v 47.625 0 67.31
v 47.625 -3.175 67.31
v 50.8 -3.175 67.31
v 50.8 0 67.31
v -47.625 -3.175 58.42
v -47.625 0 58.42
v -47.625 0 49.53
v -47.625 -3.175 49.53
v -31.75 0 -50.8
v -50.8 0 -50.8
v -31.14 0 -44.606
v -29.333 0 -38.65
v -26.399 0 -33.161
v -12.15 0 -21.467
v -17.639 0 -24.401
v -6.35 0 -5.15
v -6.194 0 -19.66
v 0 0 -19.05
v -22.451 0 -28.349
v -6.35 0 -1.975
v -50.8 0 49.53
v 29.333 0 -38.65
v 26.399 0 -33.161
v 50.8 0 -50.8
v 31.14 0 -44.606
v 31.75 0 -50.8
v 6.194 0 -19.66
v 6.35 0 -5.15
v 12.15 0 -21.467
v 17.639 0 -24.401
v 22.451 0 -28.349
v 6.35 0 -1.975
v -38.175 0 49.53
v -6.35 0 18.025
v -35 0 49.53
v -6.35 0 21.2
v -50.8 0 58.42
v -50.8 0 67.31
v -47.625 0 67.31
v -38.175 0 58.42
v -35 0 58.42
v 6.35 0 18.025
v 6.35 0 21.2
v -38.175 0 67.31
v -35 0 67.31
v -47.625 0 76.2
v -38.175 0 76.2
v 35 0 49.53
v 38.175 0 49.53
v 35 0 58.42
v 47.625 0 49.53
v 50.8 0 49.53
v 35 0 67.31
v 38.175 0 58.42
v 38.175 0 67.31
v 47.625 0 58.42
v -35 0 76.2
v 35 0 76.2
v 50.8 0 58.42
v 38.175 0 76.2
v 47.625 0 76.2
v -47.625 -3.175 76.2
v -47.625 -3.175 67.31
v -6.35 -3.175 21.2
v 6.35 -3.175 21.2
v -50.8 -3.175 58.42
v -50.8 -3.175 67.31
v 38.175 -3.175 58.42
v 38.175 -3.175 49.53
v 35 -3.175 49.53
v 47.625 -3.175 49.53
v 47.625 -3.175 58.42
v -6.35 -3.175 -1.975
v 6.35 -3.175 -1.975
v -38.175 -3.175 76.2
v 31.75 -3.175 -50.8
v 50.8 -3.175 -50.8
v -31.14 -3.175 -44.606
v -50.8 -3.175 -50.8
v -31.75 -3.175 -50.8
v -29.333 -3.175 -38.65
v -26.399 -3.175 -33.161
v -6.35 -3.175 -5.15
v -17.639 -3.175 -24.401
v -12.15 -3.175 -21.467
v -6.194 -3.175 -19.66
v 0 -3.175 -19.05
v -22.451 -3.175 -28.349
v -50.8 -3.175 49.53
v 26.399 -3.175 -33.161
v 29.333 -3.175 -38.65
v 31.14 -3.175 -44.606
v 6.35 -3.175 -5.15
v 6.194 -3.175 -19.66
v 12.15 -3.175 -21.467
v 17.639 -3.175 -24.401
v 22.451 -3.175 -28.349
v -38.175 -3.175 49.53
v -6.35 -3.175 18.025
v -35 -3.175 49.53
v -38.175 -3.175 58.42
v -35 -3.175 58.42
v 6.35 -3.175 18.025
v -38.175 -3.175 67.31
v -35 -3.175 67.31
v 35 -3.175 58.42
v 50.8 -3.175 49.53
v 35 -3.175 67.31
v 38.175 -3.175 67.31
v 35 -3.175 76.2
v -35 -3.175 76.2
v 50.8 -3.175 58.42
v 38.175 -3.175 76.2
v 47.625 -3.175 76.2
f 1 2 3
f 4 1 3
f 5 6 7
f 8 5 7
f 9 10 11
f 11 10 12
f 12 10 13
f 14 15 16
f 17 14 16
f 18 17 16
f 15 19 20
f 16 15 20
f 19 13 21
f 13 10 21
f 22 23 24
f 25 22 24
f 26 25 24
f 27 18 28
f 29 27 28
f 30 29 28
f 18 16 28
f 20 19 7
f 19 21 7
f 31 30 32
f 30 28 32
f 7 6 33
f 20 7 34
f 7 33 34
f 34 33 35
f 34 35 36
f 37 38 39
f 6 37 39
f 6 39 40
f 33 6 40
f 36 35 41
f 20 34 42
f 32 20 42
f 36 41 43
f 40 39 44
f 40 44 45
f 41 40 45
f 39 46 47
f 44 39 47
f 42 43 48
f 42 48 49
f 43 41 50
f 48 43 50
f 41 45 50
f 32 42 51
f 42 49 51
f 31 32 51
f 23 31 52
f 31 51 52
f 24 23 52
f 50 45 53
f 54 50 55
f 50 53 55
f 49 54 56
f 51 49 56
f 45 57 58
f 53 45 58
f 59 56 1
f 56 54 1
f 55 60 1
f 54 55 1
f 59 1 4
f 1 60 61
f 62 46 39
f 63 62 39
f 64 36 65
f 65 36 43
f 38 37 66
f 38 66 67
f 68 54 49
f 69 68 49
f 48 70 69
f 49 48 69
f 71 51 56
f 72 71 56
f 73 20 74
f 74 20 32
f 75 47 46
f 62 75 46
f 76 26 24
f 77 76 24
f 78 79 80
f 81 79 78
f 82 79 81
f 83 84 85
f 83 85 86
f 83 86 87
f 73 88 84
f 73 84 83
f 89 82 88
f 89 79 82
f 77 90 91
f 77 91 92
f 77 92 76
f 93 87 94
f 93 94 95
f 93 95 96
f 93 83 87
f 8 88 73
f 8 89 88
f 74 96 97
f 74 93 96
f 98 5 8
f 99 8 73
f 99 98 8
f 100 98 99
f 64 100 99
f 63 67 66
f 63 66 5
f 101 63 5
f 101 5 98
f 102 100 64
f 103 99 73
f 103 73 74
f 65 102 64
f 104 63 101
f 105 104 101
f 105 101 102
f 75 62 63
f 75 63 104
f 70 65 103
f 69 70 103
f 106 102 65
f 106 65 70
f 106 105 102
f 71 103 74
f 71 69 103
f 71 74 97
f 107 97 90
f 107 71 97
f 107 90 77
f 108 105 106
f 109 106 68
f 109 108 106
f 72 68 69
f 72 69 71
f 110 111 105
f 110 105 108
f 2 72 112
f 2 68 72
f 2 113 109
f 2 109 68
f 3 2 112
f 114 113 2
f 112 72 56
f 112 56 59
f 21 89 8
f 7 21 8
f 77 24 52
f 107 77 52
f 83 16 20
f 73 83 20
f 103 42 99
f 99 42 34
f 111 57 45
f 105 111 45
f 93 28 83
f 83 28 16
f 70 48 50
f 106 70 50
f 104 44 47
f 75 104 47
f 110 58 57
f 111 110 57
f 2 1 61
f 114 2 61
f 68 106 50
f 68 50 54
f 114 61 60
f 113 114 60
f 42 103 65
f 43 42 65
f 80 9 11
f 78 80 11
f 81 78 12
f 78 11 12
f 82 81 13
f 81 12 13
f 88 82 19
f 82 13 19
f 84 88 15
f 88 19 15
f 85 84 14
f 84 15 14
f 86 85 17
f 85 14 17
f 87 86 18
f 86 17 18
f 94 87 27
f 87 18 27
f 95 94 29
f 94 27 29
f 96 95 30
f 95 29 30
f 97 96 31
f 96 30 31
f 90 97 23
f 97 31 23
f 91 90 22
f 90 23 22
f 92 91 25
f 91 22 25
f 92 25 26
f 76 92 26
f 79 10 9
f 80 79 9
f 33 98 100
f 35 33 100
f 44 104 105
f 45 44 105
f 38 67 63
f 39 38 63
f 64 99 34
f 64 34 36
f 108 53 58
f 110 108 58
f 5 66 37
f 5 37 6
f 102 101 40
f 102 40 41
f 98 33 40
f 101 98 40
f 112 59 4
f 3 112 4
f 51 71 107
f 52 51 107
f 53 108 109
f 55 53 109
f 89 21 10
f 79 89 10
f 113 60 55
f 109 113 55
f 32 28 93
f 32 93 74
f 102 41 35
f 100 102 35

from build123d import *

# Parameters (mm, degrees)
F0_W     = 3.175
F0_H     = 8.89
F0_H_2   = 12.7
F0_H_3   = 49.53
F0_H_4   = 27.94
F0_W_2   = 8.89
F0_H_5   = 11.43
F0_W_3   = 12.7
F0_H_6   = 3.175
F1_DEPTH = 3.175


with BuildPart() as f1:
    # F0 (on Front) → F1 (new body)
    with BuildSketch(Plane.XZ):
        with BuildLine():
            Line((-38.175, 76.2), (-47.625, 76.2))
            Line((-47.625, 76.2), (-47.625, 67.31))
            Line((-47.625, 67.31), (-47.625, 58.42))
            Line((-47.625, 58.42), (-47.625, 49.53))
            Line((-47.625, 49.53), (-47.625, 40.64))
            Line((-47.625, 40.64), (-47.625, 27.94))
            Line((-47.625, 27.94), (-47.625, 0))
            Line((-47.625, 0), (-50.8, 0))
            Line((-50.8, 0), (-50.8, -50.8))
            Line((-50.8, -50.8), (-43.18, -50.8))
            Line((-43.18, -50.8), (-43.18, -41.91))
            Line((-43.18, -41.91), (-34.29, -41.91))
            Line((-34.29, -41.91), (-34.29, -50.8))
            Line((-34.29, -50.8), (-31.75, -50.8))
            ThreePointArc((-31.75, -50.8), (0, -19.05), (31.75, -50.8))
            Line((31.75, -50.8), (50.8, -50.8))
            Line((50.8, -50.8), (50.8, 0))
            Line((50.8, 0), (47.625, 0))
            Line((47.625, 0), (47.625, 12.7))
            Line((47.625, 12.7), (47.625, 25.4))
            Line((47.625, 25.4), (47.625, 38.1))
            Line((47.625, 38.1), (47.625, 49.53))
            Line((47.625, 49.53), (47.625, 58.42))
            Line((47.625, 58.42), (47.625, 67.31))
            Line((47.625, 67.31), (47.625, 76.2))
            Line((47.625, 76.2), (38.175, 76.2))
            Line((38.175, 76.2), (38.175, 67.31))
            Line((38.175, 67.31), (38.175, 58.42))
            Line((38.175, 58.42), (38.175, 49.53))
            Line((38.175, 49.53), (38.175, 40.64))
            Line((38.175, 40.64), (38.175, 27.94))
            Line((38.175, 27.94), (38.175, 0))
            Line((38.175, 0), (35, 0))
            Line((35, 0), (35, 27.94))
            Line((35, 27.94), (35, 40.64))
            Line((35, 40.64), (35, 49.53))
            Line((35, 49.53), (35, 58.42))
            Line((35, 58.42), (35, 67.31))
            Line((35, 67.31), (35, 76.2))
            Line((35, 76.2), (-35, 76.2))
            Line((-35, 76.2), (-35, 67.31))
            Line((-35, 67.31), (-35, 58.42))
            Line((-35, 58.42), (-35, 49.53))
            Line((-35, 49.53), (-35, 0))
            Line((-35, 0), (-38.175, 0))
            Line((-38.175, 0), (-38.175, 49.53))
            Line((-38.175, 49.53), (-38.175, 58.42))
            Line((-38.175, 58.42), (-38.175, 67.31))
            Line((-38.175, 67.31), (-38.175, 76.2))
        make_face()
        Polygon((19.05, -1.975), (31.75, -1.975), (31.75, -5.15), (19.05, -5.15), (6.35, -5.15), (-6.35, -5.15), (-19.05, -5.15), (-31.75, -5.15), (-31.75, -1.975), (-19.05, -1.975), (-6.35, -1.975), (6.35, -1.975), align=None, mode=Mode.SUBTRACT)
        Polygon((19.05, 21.2), (31.75, 21.2), (31.75, 18.025), (19.05, 18.025), (6.35, 18.025), (-6.35, 18.025), (-19.05, 18.025), (-31.75, 18.025), (-31.75, 21.2), (-19.05, 21.2), (-6.35, 21.2), (6.35, 21.2), align=None, mode=Mode.SUBTRACT)
        with Locations((-49.2125, 62.865)):
            Rectangle(F0_W, F0_H)
        with Locations((-36.5875, 62.865)):
            Rectangle(F0_W, F0_H)
        with Locations((-49.2125, 45.085)):
            Rectangle(F0_W, F0_H)
        with Locations((-49.2125, 34.29)):
            Rectangle(F0_W, F0_H_2)
        with Locations((36.5875, 62.865)):
            Rectangle(F0_W, F0_H)
        with Locations((-36.5875, 24.765)):
            Rectangle(F0_W, F0_H_3)
        with Locations((-49.2125, 13.97)):
            Rectangle(F0_W, F0_H_4)
        with Locations((49.2125, 62.865)):
            Rectangle(F0_W, F0_H)
        with Locations((36.5875, 45.085)):
            Rectangle(F0_W, F0_H)
        with Locations((36.5875, 34.29)):
            Rectangle(F0_W, F0_H_2)
        with Locations((-38.735, -46.355)):
            Rectangle(F0_W_2, F0_H)
        with Locations((49.2125, 43.815)):
            Rectangle(F0_W, F0_H_5)
        with Locations((36.5875, 13.97)):
            Rectangle(F0_W, F0_H_4)
        with Locations((49.2125, 31.75)):
            Rectangle(F0_W, F0_H_2)
        with Locations((49.2125, 19.05)):
            Rectangle(F0_W, F0_H_2)
        with Locations((49.2125, 6.35)):
            Rectangle(F0_W, F0_H_2)
        with Locations((25.4, 19.6125)):
            Rectangle(F0_W_3, F0_H_6)
        with Locations((12.7, 19.6125)):
            Rectangle(F0_W_3, F0_H_6)
        with Locations((-12.7, 19.6125)):
            Rectangle(F0_W_3, F0_H_6)
        with Locations((-25.4, 19.6125)):
            Rectangle(F0_W_3, F0_H_6)
        with Locations((25.4, -3.5625)):
            Rectangle(F0_W_3, F0_H_6)
        with Locations((12.7, -3.5625)):
            Rectangle(F0_W_3, F0_H_6)
        with Locations((-12.7, -3.5625)):
            Rectangle(F0_W_3, F0_H_6)
        with Locations((-25.4, -3.5625)):
            Rectangle(F0_W_3, F0_H_6)
    extrude(amount=F1_DEPTH)


solid = f1.part
